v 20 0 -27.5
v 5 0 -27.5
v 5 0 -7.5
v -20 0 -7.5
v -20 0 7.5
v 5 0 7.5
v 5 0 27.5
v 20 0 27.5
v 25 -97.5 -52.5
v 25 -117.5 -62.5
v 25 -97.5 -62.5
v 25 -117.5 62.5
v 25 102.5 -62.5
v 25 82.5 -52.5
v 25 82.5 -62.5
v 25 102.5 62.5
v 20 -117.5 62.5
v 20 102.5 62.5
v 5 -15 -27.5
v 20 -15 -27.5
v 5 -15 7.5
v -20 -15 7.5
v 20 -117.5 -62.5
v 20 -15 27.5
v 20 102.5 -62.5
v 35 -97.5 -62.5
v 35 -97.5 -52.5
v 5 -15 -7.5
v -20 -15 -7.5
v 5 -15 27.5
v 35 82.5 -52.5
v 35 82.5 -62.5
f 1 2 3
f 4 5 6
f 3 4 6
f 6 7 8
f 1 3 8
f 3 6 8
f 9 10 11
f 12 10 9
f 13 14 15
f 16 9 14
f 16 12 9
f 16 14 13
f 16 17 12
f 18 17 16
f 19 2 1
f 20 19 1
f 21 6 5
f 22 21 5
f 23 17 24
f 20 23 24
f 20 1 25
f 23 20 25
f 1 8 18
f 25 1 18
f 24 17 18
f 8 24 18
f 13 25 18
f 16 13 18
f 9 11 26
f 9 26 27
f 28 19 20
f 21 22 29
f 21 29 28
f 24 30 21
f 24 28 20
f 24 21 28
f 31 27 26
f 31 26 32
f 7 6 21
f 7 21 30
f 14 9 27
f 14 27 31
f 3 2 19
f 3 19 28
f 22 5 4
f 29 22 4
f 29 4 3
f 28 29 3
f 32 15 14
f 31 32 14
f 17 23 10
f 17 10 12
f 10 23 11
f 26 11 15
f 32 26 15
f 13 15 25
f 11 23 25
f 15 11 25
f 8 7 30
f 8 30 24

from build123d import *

# Parameters (mm, degrees)
F0_W     = 15
F0_H     = 20
F1_DEPTH = 15
F2_W     = 220
F2_H     = 125
F2_W_2   = 15
F2_H_2   = 55
F3_DEPTH = 5
F4_W     = 180
F4_H     = 10
F5_DEPTH = 10


with BuildPart() as f1:
    # F0 (on Front) → F1 (new body)
    with BuildSketch(Plane.XZ):
        with Locations((12.5, 17.5)):
            Rectangle(F0_W, F0_H)
        with Locations((12.5, -17.5)):
            Rectangle(F0_W, F0_H)
        Polygon((5, 7.5), (-20, 7.5), (-20, -7.5), (5, -7.5), (20, -7.5), (20, 7.5), align=None)
    extrude(amount=F1_DEPTH)

    # F2 (on face) → F3 (join)
    with BuildSketch(Plane.YZ.offset(20)):
        with Locations((-7.5, 0)):
            Rectangle(F2_W, F2_H)
        with Locations((-7.5, 0)):
            Rectangle(F2_W_2, F2_H_2, mode=Mode.SUBTRACT)
        with Locations((-7.5, 0)):
            Rectangle(F2_W_2, F2_H_2)
    extrude(amount=F3_DEPTH)

    # F4 (on face) → F5 (join)
    with BuildSketch(Plane.YZ.offset(25)):
        with Locations((-7.5, -57.5)):
            Rectangle(F4_W, F4_H)
    extrude(amount=F5_DEPTH)


solid = f1.part
